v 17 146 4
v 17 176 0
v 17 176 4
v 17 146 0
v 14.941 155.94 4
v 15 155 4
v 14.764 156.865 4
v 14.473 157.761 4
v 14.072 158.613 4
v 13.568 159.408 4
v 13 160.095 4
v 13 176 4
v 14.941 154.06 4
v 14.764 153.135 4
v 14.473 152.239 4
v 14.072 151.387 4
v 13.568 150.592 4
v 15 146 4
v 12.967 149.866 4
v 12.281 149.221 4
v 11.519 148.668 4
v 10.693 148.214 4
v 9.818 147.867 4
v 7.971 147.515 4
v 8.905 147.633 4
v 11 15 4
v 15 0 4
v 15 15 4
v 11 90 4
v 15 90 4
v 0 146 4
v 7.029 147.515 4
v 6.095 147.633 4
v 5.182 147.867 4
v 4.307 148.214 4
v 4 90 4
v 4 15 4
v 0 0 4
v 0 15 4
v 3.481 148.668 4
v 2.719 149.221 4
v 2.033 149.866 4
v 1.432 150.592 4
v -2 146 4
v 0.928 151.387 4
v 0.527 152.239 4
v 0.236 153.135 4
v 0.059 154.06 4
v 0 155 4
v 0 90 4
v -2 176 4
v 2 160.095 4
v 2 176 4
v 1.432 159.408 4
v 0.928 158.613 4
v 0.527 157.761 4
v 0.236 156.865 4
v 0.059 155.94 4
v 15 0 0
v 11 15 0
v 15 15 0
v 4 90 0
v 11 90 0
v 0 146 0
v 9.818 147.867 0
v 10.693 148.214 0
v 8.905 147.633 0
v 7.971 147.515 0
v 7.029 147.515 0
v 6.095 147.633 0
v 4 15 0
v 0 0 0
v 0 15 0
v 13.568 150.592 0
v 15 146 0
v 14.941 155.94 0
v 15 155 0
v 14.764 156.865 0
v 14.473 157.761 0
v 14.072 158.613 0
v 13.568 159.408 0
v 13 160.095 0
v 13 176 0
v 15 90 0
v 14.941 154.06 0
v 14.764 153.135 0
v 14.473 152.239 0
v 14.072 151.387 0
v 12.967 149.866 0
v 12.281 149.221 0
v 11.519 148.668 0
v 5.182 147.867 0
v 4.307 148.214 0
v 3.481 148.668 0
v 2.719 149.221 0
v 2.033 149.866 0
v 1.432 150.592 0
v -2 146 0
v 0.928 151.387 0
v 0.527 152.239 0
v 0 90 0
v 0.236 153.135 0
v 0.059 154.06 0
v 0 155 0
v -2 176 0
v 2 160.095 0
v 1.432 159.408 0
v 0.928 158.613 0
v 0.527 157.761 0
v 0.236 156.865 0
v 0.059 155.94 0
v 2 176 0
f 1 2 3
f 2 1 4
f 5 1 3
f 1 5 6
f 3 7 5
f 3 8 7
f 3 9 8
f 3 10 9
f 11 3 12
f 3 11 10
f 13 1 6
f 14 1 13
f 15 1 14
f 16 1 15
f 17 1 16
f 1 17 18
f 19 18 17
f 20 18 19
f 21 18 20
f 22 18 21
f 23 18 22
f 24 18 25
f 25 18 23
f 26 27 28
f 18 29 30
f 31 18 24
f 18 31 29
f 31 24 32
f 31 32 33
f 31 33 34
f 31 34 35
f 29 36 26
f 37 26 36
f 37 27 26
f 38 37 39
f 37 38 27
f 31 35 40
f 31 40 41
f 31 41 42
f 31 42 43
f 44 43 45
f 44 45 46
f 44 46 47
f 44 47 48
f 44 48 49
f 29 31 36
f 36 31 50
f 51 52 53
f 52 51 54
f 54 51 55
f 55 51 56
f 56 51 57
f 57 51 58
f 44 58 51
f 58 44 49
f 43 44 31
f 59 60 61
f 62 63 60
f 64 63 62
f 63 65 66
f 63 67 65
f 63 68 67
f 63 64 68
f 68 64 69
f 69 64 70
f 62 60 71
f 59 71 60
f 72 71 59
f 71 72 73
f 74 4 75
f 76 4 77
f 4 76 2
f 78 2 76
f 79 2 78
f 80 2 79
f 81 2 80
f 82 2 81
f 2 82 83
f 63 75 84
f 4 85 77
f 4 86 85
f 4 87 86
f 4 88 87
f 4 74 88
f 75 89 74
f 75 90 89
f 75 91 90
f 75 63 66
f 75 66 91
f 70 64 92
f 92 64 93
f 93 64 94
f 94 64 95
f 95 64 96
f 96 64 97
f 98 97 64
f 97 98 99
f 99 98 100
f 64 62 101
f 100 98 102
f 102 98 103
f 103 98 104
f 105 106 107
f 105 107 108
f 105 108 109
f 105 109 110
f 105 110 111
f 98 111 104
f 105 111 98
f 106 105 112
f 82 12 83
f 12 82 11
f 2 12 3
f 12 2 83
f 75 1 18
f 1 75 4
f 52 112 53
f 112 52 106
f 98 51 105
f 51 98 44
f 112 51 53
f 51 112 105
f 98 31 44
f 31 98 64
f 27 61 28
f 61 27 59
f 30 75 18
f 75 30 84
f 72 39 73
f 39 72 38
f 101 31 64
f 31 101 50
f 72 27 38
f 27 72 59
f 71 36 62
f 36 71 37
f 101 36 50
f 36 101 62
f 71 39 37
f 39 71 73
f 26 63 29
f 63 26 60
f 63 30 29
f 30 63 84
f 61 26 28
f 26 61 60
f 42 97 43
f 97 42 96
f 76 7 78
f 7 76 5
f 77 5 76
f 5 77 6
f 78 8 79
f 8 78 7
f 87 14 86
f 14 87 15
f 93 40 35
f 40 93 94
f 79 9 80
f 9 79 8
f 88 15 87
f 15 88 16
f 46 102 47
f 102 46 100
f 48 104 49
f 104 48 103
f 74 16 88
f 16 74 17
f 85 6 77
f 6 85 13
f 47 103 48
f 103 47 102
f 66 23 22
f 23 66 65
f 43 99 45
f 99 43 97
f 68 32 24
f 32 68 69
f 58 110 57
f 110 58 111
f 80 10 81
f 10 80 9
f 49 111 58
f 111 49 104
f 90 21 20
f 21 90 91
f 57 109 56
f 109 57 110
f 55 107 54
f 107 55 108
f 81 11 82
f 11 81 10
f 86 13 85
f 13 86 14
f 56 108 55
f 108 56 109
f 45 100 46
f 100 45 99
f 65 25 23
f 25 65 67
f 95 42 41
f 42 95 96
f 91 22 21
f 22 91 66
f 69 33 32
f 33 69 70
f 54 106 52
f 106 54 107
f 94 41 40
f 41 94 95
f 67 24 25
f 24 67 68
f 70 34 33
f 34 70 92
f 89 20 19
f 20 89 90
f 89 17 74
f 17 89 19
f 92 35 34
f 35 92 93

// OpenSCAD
neckLength = 150;
neckWidth = 15;
armLength = 30;
armWidth = 4;





difference(){
    translate([0,0,0]){
        cube([neckWidth,neckLength,4]);
        translate([neckWidth / 2,neckLength - armWidth,0]){
            //cylinder(h=4,r=8,$fn=50);
            translate([(neckWidth / 2)  -(armWidth / 2), 0, 0]){
                cube([4,armLength, 4]);
            }
        
            translate([-(neckWidth / 2) - (armWidth / 2) , 0, 0]){
                cube([4,armLength, 4]);
            }
        }
    }
    
    translate([0 -1, neckWidth, 0]){
        #cube([neckWidth / 3, neckLength / 2, armWidth]);
        
    }
    translate([neckWidth - armWidth , 15, 0]){
        #cube([neckWidth / 3, neckLength / 2, armWidth]);
        
    }
    
    translate([neckWidth / 2,neckLength + 5,0])
    #cylinder(h=4,r=neckWidth * 0.5,$fn=50);
}
